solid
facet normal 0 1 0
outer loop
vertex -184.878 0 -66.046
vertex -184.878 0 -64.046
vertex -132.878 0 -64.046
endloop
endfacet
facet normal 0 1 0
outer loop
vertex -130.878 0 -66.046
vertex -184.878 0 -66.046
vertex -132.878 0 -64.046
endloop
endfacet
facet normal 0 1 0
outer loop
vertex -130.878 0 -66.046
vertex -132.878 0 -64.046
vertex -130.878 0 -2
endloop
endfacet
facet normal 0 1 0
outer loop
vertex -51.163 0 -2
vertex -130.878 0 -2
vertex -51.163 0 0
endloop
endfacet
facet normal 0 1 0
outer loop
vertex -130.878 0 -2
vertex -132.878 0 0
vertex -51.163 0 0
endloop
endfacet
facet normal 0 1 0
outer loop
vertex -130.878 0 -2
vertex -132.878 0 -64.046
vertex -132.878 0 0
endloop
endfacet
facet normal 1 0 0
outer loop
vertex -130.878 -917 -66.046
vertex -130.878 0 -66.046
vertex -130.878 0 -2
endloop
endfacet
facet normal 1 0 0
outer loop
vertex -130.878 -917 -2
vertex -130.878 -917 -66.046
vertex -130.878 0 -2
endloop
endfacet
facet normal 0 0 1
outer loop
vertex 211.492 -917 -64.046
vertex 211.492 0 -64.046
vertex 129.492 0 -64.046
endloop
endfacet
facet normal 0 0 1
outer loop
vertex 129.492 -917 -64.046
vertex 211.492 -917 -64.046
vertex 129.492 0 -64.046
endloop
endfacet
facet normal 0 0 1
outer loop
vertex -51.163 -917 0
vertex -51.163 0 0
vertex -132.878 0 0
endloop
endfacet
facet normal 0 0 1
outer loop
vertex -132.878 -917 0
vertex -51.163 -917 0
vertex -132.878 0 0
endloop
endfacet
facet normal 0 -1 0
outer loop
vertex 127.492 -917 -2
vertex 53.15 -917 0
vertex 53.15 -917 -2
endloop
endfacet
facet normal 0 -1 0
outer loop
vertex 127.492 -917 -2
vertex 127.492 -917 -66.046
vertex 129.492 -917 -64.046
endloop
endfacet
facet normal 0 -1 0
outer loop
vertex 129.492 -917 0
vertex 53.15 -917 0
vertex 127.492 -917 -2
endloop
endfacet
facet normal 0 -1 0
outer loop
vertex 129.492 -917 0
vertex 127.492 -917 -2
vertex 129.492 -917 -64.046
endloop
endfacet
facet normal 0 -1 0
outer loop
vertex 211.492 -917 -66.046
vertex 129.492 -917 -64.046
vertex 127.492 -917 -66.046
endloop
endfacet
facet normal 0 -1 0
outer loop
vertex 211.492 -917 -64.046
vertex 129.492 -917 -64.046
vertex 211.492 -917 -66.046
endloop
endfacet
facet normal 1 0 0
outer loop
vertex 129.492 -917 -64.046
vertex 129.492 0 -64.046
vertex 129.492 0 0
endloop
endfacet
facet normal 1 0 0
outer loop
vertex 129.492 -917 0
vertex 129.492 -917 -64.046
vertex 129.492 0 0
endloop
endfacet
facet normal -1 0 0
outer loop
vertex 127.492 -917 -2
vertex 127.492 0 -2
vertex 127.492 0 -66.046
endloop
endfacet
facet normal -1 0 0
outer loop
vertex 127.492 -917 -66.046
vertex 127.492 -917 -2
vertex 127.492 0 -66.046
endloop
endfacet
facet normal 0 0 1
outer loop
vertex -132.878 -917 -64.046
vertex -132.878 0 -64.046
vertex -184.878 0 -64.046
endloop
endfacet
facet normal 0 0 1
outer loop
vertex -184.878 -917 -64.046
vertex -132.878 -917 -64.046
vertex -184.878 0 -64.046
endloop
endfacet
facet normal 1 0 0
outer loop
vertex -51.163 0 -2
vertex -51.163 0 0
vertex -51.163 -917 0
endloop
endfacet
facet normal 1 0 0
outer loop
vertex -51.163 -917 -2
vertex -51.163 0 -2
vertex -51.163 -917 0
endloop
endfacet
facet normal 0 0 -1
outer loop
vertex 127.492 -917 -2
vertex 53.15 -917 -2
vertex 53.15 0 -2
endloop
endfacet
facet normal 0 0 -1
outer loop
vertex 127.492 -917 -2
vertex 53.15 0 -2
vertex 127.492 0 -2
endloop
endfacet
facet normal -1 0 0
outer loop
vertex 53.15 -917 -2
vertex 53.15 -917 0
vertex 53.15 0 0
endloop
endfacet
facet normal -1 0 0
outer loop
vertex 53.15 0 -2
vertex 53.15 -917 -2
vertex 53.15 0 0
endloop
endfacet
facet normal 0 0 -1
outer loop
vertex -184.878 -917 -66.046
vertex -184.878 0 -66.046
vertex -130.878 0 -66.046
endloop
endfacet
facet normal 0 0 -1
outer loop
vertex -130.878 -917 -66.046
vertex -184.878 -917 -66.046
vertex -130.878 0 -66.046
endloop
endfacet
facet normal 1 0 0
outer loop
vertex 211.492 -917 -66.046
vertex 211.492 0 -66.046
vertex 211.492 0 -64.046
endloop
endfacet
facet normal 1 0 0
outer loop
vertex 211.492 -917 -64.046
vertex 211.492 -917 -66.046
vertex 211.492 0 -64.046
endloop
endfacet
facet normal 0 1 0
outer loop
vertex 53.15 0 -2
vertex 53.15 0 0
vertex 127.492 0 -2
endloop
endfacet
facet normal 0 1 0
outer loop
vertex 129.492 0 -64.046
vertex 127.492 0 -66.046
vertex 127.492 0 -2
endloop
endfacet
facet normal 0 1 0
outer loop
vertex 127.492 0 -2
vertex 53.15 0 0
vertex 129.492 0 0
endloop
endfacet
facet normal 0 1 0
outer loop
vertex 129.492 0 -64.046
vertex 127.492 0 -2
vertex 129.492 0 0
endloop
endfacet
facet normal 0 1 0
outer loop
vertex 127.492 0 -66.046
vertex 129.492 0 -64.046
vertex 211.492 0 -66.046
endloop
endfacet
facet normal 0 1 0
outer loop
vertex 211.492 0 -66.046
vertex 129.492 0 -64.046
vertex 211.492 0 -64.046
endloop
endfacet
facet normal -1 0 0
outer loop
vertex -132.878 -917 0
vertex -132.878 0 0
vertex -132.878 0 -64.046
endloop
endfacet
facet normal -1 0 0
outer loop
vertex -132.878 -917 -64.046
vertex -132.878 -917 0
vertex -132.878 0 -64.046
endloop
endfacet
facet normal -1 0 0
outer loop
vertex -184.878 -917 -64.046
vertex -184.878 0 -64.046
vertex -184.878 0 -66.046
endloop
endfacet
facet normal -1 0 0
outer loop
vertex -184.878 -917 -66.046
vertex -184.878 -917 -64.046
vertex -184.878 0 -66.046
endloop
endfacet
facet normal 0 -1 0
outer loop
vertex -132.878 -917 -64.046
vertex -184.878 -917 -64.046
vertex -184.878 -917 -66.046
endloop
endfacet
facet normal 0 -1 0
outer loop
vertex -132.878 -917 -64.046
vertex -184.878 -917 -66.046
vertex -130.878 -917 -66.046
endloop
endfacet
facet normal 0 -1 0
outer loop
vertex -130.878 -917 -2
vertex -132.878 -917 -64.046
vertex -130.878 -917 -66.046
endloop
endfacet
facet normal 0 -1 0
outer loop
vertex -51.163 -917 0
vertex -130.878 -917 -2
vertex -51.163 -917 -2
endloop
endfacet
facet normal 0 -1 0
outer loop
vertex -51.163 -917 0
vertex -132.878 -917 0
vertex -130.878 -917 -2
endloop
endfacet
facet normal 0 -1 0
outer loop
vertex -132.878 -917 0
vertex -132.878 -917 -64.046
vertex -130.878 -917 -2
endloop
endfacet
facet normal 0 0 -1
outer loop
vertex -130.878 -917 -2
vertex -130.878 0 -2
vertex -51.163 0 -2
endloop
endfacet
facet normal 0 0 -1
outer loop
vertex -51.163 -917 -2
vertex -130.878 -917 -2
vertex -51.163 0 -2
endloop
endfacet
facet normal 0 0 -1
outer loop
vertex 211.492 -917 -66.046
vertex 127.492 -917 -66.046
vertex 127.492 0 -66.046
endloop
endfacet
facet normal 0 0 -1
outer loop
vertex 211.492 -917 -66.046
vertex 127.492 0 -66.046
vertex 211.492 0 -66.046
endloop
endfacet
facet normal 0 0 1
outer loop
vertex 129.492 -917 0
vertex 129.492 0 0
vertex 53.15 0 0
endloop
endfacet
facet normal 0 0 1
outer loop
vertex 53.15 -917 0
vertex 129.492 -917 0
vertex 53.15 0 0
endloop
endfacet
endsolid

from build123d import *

# Parameters (mm, degrees)
F1_DEPTH = 917
F3_DEPTH = 2


# Not quite as in the source:
# - a feature names something its author has since deleted; it is built from what else it names


with BuildPart() as f1:
    # F0 (on Front) → F1 (new body)
    with BuildSketch(Plane.XZ):
        Polygon((133.3621336615, -66.0460090514), (211.4915523357, -66.0460090514), (211.4915523357, -64.0460090514), (129.4915523357, -64.0460090514), (129.4915523357, 0), (-132.8778128425, 0), (-132.8778128425, -64.0460090514), (-184.8778128425, -64.0460090514), (-184.8778128425, -66.0460090514), (-133.3621336615, -66.0460090514), (-130.8778128425, -66.0460090514), (-130.8778128425, -2), (127.4915523357, -2), (127.4915523357, -66.0460090514), align=None)
    extrude(amount=F1_DEPTH)

    # F2 (on Top) → F3 (cut)
    with BuildSketch(Plane.XY):
        Polygon((53.1499173463, 0), (-51.1629678309, 0), (-51.1629678309, -190.4399693012), (-51.1629678309, -198.6912098614), (-51.1629678309, -718.3087901386), (-51.1629678309, -917), (53.1499173463, -917), (53.1499173463, -718.3087901386), (53.1499173463, -198.6912098614), align=None)
    extrude(amount=-F3_DEPTH, mode=Mode.SUBTRACT)


solid = f1.part
